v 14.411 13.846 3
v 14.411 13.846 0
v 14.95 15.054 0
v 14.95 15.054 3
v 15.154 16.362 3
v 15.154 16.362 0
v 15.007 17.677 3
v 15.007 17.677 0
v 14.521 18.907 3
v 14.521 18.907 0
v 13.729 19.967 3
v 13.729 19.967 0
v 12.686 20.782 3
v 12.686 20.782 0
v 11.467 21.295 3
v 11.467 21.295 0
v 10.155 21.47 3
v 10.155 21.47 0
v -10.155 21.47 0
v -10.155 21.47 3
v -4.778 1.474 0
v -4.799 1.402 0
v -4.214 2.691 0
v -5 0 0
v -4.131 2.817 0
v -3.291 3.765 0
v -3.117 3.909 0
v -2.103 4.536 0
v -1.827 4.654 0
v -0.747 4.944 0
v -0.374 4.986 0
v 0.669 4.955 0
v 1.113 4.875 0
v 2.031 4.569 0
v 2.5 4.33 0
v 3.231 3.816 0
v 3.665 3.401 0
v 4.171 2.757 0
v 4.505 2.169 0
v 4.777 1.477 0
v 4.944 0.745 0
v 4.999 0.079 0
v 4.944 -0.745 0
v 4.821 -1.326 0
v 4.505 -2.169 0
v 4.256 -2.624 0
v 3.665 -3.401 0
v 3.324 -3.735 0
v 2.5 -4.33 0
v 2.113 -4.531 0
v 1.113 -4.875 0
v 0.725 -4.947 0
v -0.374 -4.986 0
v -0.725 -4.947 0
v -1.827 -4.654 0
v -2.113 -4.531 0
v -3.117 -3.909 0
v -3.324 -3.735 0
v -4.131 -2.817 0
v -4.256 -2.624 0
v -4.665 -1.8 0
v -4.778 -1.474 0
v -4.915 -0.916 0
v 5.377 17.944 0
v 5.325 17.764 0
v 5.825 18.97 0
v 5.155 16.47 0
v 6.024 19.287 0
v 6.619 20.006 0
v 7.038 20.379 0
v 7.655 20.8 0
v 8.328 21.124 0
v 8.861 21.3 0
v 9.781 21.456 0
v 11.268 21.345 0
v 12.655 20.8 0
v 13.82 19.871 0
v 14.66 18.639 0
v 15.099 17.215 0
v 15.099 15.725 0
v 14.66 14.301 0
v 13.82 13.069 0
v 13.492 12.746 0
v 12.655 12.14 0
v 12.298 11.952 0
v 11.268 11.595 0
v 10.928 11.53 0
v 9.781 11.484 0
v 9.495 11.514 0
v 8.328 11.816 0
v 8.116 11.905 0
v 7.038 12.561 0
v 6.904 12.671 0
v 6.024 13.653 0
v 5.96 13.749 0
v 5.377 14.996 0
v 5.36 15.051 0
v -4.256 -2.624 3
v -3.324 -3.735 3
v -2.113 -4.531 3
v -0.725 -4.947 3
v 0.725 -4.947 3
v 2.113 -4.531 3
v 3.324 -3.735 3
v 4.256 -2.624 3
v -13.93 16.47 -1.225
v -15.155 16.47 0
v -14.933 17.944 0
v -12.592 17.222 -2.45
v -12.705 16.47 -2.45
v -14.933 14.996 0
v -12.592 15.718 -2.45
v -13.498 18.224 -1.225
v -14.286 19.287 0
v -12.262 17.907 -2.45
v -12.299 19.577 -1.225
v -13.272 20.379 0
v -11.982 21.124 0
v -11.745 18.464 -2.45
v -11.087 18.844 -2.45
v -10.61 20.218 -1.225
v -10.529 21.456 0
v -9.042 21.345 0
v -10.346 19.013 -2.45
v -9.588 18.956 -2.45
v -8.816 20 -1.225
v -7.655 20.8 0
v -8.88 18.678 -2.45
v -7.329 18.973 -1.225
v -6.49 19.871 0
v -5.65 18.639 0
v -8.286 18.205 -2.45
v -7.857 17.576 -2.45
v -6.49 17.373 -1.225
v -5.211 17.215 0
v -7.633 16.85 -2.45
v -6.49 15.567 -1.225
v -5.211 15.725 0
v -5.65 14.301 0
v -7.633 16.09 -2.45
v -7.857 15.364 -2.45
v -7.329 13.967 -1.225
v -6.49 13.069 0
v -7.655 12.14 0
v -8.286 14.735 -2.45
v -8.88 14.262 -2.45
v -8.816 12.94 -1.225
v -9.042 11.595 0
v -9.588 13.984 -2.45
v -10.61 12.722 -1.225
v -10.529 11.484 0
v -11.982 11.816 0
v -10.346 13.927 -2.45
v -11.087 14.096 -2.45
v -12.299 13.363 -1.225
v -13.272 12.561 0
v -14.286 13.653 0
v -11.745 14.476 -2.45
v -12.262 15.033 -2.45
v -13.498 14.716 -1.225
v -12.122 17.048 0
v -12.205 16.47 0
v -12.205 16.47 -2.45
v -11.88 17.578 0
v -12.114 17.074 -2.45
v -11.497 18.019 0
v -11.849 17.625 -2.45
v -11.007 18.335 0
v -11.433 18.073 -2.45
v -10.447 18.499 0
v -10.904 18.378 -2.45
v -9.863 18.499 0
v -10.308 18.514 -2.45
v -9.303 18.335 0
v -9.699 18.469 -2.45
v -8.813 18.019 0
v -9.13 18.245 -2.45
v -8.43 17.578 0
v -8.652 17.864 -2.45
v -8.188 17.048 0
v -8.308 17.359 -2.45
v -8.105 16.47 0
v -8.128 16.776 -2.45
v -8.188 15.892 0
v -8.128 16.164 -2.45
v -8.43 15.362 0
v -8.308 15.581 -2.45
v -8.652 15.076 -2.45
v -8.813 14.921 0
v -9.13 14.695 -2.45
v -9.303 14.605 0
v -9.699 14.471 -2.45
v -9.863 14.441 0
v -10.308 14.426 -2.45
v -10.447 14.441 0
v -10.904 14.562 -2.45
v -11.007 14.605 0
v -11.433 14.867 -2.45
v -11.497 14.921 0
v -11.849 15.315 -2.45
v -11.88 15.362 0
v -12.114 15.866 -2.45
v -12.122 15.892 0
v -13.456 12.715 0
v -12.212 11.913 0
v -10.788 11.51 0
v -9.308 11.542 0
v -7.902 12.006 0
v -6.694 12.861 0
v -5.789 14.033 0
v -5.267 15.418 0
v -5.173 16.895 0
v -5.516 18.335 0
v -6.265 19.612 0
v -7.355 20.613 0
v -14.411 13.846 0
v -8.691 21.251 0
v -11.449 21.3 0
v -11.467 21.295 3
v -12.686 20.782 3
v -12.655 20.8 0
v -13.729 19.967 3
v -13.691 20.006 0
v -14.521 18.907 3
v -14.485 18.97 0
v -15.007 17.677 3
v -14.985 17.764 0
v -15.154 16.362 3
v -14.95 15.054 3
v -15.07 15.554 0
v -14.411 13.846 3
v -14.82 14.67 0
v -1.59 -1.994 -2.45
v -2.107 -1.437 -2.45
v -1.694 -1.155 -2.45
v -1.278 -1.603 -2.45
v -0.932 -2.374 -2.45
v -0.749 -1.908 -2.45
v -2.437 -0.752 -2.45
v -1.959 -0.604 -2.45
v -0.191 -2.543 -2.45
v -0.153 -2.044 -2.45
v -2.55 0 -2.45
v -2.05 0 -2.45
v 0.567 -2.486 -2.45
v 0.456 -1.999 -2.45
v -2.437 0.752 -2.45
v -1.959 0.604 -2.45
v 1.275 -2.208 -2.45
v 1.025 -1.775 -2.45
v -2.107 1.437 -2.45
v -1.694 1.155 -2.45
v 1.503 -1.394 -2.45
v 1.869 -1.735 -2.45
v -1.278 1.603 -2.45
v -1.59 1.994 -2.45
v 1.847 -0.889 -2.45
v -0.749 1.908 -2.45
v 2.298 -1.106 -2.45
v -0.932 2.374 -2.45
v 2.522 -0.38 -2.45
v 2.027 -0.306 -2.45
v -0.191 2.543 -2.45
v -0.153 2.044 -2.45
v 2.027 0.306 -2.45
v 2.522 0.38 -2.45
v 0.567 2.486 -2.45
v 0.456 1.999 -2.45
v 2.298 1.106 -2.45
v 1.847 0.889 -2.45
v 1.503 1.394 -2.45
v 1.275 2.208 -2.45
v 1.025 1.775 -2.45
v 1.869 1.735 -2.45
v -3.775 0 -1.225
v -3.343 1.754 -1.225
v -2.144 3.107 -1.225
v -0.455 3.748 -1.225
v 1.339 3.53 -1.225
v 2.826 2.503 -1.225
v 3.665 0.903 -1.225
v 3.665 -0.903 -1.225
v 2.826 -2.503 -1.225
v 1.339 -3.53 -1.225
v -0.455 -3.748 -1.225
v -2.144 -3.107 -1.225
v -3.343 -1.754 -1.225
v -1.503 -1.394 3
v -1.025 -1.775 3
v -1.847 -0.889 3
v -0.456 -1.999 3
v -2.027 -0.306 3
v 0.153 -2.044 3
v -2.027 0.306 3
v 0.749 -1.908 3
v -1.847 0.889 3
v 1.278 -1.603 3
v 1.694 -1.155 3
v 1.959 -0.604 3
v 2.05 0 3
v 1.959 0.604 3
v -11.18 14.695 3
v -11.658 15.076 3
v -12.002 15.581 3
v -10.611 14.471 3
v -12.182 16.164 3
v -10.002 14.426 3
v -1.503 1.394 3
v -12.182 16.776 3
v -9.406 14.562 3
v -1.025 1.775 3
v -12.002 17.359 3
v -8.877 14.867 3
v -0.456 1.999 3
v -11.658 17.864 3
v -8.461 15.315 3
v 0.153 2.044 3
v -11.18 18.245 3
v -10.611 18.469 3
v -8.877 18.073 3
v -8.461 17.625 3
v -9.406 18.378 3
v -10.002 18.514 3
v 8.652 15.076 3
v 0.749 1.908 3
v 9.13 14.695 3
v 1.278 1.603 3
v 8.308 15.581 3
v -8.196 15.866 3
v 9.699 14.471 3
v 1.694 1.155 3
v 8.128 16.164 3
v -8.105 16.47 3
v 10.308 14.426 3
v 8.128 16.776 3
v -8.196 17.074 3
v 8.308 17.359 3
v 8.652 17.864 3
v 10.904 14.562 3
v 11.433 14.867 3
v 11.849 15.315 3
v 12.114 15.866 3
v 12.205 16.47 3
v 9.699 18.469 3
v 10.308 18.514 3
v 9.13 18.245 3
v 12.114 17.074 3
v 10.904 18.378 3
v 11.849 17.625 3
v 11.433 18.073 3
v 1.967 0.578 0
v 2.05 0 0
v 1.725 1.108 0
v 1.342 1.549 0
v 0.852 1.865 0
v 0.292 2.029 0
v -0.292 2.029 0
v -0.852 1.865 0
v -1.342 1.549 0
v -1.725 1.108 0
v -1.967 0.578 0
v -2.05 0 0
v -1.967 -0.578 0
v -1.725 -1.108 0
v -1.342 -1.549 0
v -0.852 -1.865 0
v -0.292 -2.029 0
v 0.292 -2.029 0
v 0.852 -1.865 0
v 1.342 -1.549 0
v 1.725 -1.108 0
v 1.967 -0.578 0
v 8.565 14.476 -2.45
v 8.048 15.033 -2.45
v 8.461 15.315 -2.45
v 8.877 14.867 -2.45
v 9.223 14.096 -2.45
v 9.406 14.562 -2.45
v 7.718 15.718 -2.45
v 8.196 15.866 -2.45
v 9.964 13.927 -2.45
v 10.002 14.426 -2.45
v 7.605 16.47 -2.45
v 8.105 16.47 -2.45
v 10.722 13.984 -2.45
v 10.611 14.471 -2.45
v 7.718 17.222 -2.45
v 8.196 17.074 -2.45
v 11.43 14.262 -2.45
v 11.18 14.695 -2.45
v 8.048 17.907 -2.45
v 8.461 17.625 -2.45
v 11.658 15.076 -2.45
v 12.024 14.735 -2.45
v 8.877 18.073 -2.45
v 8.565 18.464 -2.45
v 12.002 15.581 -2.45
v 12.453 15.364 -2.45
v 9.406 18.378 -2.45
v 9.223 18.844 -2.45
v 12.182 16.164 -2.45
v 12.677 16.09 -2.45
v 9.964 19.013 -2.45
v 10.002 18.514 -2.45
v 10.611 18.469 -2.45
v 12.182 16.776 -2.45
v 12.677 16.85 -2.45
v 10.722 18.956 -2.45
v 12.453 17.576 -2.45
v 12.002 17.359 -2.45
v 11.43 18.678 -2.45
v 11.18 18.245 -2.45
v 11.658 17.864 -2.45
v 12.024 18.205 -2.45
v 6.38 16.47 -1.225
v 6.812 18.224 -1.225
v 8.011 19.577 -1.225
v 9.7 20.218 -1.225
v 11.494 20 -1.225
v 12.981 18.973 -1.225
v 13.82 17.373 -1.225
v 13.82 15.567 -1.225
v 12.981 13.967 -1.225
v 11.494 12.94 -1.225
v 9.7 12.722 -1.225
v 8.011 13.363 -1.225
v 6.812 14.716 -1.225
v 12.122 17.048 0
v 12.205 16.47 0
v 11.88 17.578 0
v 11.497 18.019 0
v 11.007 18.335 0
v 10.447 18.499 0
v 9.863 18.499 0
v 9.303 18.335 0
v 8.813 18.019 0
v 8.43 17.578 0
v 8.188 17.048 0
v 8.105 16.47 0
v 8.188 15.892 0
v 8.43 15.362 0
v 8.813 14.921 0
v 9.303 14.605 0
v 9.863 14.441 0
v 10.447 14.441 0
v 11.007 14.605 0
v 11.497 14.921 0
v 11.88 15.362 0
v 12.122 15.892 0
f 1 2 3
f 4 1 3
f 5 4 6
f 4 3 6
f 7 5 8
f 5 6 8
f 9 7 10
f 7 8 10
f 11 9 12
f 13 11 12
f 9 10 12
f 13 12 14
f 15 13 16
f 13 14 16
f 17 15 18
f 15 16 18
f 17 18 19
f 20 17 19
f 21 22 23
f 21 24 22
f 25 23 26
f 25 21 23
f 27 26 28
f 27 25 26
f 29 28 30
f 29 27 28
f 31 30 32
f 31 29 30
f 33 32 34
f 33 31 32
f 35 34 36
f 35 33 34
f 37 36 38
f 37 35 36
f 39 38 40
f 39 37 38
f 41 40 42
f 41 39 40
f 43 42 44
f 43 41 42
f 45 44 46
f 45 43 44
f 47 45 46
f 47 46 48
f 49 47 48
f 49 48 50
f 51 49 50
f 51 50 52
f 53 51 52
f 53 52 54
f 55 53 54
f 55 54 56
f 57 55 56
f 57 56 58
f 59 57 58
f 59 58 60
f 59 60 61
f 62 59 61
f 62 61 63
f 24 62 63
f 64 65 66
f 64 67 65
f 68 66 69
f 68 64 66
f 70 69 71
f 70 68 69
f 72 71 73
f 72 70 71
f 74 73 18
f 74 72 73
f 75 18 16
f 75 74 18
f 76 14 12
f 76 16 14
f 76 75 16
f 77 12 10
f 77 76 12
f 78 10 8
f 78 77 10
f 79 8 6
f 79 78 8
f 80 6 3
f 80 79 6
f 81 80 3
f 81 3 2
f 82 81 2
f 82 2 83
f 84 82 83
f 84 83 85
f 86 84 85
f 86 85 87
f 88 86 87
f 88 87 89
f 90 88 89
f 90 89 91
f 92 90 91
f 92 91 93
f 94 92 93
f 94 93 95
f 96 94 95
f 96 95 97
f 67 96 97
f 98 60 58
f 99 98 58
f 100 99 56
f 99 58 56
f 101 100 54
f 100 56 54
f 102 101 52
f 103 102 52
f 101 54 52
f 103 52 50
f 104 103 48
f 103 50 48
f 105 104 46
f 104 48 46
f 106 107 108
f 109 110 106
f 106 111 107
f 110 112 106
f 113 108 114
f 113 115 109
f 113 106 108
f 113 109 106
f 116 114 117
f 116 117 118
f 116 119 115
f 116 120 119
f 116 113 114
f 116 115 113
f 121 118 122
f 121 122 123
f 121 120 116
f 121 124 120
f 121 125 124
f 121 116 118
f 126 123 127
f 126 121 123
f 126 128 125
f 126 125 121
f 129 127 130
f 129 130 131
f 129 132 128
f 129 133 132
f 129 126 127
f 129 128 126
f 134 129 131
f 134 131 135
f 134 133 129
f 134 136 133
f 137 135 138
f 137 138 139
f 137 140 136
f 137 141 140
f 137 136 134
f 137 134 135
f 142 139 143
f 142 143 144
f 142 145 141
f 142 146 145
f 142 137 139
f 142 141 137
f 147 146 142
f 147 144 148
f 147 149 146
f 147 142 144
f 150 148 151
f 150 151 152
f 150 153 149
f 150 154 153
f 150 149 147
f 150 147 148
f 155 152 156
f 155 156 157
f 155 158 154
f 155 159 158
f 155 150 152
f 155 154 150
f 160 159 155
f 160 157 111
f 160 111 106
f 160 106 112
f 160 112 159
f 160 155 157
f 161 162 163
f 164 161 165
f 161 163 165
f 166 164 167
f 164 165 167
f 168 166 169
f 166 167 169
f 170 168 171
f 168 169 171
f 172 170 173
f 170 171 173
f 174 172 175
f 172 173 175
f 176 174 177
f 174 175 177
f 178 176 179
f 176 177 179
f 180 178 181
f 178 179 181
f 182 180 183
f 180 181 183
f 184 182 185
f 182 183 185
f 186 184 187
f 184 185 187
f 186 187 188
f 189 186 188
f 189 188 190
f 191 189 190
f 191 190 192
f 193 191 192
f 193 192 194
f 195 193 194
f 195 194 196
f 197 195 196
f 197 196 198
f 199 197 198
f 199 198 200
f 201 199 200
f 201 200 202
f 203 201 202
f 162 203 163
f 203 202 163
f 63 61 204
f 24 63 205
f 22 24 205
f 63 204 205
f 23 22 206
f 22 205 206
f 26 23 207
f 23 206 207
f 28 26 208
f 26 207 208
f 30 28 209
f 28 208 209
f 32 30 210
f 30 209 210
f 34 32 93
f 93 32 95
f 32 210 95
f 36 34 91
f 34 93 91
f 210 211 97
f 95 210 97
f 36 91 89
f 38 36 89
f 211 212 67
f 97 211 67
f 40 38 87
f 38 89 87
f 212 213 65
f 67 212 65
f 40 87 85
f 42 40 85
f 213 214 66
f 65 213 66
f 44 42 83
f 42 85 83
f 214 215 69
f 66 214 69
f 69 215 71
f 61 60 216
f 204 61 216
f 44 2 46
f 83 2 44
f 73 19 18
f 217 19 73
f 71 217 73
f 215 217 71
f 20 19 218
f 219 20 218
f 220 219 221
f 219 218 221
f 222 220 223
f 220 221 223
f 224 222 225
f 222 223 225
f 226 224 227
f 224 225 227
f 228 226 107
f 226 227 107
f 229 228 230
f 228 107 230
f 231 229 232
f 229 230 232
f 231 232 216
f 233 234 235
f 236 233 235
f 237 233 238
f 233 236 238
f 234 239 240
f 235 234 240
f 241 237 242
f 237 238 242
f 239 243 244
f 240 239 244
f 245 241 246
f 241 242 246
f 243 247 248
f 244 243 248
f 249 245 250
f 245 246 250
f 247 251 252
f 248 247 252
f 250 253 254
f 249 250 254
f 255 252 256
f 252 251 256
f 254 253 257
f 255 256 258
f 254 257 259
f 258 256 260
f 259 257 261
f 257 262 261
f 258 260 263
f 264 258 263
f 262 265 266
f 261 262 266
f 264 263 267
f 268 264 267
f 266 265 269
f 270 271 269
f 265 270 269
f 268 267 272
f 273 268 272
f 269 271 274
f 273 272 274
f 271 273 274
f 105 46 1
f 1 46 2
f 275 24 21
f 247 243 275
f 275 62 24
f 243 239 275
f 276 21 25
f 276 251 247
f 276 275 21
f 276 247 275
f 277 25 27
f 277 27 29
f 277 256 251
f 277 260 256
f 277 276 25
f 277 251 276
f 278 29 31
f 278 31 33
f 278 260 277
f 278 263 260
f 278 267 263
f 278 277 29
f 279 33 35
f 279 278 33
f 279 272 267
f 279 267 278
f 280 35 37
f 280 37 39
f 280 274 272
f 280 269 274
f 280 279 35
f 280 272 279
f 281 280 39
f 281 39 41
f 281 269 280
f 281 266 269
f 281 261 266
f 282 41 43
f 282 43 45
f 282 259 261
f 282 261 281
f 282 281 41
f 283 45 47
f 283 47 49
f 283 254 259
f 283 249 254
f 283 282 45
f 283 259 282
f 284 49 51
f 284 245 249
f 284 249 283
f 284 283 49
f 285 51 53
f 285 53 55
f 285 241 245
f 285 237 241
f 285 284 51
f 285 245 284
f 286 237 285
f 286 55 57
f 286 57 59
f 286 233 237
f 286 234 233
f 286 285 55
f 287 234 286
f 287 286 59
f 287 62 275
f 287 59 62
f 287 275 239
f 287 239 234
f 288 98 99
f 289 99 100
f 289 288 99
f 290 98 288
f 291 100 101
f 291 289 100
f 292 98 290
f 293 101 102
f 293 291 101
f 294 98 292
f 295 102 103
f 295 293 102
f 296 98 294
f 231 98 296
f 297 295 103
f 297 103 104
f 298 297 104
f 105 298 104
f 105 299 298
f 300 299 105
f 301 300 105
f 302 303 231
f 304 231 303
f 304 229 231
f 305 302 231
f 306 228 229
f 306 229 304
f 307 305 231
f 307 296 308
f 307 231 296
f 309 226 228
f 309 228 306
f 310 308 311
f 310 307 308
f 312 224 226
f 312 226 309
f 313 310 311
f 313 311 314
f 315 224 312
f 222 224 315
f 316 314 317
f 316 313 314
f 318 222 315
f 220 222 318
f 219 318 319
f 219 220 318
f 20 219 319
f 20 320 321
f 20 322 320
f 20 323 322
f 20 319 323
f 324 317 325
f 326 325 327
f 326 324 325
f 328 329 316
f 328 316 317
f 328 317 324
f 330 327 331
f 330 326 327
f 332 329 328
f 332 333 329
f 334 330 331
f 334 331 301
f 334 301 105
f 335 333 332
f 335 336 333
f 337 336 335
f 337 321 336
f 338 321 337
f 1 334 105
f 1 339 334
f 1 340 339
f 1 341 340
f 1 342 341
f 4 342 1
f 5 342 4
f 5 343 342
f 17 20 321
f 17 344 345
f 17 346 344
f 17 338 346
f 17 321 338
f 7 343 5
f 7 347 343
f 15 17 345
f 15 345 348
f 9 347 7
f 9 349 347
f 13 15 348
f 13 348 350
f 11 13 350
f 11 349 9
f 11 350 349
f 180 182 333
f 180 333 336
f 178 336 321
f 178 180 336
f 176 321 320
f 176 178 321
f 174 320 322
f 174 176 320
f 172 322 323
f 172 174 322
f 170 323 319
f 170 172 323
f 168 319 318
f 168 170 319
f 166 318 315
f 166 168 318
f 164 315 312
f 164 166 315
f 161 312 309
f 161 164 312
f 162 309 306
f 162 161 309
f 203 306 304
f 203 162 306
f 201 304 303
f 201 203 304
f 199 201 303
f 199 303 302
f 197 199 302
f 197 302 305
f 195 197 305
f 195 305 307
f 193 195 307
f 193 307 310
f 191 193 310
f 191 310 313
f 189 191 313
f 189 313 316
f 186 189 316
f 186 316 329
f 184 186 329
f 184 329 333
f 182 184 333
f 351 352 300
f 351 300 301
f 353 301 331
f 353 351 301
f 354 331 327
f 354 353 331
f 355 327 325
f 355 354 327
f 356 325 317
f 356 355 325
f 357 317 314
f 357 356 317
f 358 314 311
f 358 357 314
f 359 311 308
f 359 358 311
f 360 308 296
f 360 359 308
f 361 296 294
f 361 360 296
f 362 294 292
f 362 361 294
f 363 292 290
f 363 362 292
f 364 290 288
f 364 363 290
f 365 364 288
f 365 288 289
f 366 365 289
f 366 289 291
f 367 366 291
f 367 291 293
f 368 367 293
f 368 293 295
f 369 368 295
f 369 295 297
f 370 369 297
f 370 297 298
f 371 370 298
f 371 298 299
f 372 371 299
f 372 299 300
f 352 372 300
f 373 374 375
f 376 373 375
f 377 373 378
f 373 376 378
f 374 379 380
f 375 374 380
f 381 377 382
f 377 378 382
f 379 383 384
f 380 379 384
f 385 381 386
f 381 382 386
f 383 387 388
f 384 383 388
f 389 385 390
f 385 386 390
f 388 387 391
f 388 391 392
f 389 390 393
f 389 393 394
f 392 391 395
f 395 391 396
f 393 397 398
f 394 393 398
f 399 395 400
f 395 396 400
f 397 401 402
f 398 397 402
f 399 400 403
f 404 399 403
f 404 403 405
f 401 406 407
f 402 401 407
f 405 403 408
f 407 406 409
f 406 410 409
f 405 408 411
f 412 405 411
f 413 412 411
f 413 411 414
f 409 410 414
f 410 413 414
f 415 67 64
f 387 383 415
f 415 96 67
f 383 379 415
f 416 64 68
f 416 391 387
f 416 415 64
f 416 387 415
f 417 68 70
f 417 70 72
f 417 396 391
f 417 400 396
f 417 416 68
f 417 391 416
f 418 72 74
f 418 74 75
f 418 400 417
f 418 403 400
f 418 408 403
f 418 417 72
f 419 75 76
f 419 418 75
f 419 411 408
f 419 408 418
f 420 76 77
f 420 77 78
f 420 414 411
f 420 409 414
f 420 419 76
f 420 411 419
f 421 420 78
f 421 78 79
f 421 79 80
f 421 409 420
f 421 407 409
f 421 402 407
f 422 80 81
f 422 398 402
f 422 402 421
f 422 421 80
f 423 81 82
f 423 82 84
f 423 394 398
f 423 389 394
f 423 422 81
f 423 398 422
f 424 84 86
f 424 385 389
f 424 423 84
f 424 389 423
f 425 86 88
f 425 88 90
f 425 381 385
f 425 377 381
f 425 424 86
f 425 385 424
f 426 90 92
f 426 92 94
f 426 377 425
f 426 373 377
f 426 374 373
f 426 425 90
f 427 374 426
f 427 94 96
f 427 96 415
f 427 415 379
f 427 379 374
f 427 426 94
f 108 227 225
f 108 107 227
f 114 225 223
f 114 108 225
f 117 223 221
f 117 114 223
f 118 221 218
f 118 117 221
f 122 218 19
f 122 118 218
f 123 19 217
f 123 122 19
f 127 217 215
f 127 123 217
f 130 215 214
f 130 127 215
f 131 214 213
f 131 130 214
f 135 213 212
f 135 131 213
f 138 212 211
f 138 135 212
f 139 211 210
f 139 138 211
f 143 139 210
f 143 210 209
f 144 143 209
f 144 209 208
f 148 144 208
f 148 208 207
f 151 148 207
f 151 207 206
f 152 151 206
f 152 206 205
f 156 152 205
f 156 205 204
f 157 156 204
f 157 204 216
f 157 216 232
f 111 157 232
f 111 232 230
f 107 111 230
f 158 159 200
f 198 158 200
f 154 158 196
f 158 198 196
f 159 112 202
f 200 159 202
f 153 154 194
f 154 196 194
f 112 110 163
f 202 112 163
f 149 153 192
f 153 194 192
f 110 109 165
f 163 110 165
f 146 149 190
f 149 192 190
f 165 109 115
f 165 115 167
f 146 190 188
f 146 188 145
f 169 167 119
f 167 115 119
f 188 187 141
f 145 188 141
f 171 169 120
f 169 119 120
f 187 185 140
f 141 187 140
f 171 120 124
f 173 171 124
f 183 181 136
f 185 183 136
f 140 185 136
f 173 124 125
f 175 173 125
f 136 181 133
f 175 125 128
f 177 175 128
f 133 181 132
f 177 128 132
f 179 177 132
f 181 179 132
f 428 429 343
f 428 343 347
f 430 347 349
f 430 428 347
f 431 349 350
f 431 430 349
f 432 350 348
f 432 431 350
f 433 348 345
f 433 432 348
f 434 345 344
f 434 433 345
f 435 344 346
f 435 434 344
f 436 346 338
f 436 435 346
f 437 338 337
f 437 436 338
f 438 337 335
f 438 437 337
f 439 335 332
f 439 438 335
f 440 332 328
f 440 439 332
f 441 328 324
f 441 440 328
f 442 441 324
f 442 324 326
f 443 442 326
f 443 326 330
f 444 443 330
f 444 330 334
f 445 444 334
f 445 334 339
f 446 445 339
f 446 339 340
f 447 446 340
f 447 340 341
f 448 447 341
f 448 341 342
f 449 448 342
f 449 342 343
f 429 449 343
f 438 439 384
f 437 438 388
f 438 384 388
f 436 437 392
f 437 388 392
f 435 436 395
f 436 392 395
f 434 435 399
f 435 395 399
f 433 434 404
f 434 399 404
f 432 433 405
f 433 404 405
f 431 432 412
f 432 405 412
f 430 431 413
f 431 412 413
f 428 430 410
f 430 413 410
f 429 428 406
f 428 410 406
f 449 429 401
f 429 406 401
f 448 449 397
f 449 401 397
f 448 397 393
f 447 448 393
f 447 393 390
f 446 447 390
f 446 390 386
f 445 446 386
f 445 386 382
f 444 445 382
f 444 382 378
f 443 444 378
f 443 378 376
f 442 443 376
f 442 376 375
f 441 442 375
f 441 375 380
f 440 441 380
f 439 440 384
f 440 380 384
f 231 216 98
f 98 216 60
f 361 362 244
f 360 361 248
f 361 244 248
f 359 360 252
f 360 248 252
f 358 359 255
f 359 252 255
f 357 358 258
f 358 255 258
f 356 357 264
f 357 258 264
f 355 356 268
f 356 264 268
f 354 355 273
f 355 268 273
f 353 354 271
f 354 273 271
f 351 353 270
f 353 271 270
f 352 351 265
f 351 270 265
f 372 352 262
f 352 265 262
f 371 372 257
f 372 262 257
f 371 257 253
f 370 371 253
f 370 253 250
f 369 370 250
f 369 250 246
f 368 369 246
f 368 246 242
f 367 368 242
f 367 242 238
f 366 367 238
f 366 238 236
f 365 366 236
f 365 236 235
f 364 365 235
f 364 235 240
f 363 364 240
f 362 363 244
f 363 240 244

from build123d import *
from build123d.topology import SkipClean

# Parameters (mm, degrees)
SKETCH1_R           = 2.0500000000000003
SKETCH1_R_2         = 2.05
BOSS_EXTRUDE1_DEPTH = 3
BOSS_EXTRUDE2_START = 2.95
SKETCH2_R           = 4.999999999999997
SKETCH2_R_2         = 2.05
SKETCH2_R_3         = 4.999999999999999
SKETCH2_R_4         = 2.0500000000000003
SKETCH2_R_5         = 4.999999999999998
SKETCH2_R_6         = 2.0499999999999985
BOSS_EXTRUDE2_DEPTH = 2.95
CHAMFER1_SIZE       = 2.95
SKETCH3_W           = 37.85330439531782
SKETCH3_H           = 28.758532039103056
CUT_EXTRUDE1_DEPTH  = 0.5


with BuildPart() as part:
    # Sketch1 → Boss-Extrude1 (new body)
    with BuildSketch(Plane.XY):
        with BuildLine():
            Line((-14.411027514700965, 13.845837315616981), (-4.256027514700967, -2.624162684383019))
            ThreePointArc((-4.256027514700967, -2.624162684383019), (3.1e-16, -4.999999999999998), (4.256027514700967, -2.624162684383019))
            Line((4.256027514700967, -2.624162684383019), (14.411027514700965, 13.845837315616981))
            ThreePointArc((14.411027514700965, 13.845837315616981), (14.52082256979799, 18.907128082198888), (10.155000000000001, 21.46999999999999))
            Line((10.155000000000001, 21.46999999999999), (-10.155000000000001, 21.46999999999999))
            ThreePointArc((-10.155000000000001, 21.46999999999999), (-14.520822569797986, 18.907128082198888), (-14.411027514700965, 13.845837315616981))
        make_face()
        with Locations((-10.155, 16.47)):
            Circle(SKETCH1_R, mode=Mode.SUBTRACT)
        with Locations((10.155, 16.47)):
            Circle(SKETCH1_R, mode=Mode.SUBTRACT)
        Circle(SKETCH1_R_2, mode=Mode.SUBTRACT)
    extrude(amount=BOSS_EXTRUDE1_DEPTH)

    # Sketch2 → Boss-Extrude2 (add)
    # profile 1 of 3: a face of its own
    with BuildSketch(Plane(origin=(0, 0, 0), x_dir=(-1, 0, 0), z_dir=(0, 0, -1)).offset(BOSS_EXTRUDE2_START)):
        Circle(SKETCH2_R)
        Circle(SKETCH2_R_2, mode=Mode.SUBTRACT)
    # profile 2 of 3: a face of its own
    with BuildSketch(Plane(origin=(0, 0, 0), x_dir=(-1, 0, 0), z_dir=(0, 0, -1)).offset(BOSS_EXTRUDE2_START)):
        with Locations((10.155, 16.47)):
            Circle(SKETCH2_R_3)
        with Locations((10.155, 16.47)):
            Circle(SKETCH2_R_4, mode=Mode.SUBTRACT)
    # profile 3 of 3: a face of its own
    with BuildSketch(Plane(origin=(0, 0, 0), x_dir=(-1, 0, 0), z_dir=(0, 0, -1)).offset(BOSS_EXTRUDE2_START)):
        with Locations((-10.155, 16.47)):
            Circle(SKETCH2_R_5)
        with Locations((-10.155, 16.47)):
            Circle(SKETCH2_R_6, mode=Mode.SUBTRACT)
    extrude(amount=-BOSS_EXTRUDE2_DEPTH)

    # Chamfer1
    chamfer1_edges = [part.edges().sort_by_distance(p)[0] for p in [
        (4.999999999999997, 6.1e-16, -2.95),
        (-5.155, 16.47, -2.95),
        (15.154999999999998, 16.47, -2.95),
    ]]
    chamfer(chamfer1_edges, length=CHAMFER1_SIZE - 0.0001)  # a hair under: the kernel refuses the full size

    # Sketch3 → Cut-Extrude1 (cut)
    with SkipClean():  # the faces are left unmerged after this step: merging them gives an invalid solid
        with BuildSketch(Plane.XY.offset(-2.95)):
            with Locations((0.24948253346224725, 7.962837236222983)):
                Rectangle(SKETCH3_W, SKETCH3_H)
        extrude(amount=CUT_EXTRUDE1_DEPTH, mode=Mode.SUBTRACT)


solid = part.part
